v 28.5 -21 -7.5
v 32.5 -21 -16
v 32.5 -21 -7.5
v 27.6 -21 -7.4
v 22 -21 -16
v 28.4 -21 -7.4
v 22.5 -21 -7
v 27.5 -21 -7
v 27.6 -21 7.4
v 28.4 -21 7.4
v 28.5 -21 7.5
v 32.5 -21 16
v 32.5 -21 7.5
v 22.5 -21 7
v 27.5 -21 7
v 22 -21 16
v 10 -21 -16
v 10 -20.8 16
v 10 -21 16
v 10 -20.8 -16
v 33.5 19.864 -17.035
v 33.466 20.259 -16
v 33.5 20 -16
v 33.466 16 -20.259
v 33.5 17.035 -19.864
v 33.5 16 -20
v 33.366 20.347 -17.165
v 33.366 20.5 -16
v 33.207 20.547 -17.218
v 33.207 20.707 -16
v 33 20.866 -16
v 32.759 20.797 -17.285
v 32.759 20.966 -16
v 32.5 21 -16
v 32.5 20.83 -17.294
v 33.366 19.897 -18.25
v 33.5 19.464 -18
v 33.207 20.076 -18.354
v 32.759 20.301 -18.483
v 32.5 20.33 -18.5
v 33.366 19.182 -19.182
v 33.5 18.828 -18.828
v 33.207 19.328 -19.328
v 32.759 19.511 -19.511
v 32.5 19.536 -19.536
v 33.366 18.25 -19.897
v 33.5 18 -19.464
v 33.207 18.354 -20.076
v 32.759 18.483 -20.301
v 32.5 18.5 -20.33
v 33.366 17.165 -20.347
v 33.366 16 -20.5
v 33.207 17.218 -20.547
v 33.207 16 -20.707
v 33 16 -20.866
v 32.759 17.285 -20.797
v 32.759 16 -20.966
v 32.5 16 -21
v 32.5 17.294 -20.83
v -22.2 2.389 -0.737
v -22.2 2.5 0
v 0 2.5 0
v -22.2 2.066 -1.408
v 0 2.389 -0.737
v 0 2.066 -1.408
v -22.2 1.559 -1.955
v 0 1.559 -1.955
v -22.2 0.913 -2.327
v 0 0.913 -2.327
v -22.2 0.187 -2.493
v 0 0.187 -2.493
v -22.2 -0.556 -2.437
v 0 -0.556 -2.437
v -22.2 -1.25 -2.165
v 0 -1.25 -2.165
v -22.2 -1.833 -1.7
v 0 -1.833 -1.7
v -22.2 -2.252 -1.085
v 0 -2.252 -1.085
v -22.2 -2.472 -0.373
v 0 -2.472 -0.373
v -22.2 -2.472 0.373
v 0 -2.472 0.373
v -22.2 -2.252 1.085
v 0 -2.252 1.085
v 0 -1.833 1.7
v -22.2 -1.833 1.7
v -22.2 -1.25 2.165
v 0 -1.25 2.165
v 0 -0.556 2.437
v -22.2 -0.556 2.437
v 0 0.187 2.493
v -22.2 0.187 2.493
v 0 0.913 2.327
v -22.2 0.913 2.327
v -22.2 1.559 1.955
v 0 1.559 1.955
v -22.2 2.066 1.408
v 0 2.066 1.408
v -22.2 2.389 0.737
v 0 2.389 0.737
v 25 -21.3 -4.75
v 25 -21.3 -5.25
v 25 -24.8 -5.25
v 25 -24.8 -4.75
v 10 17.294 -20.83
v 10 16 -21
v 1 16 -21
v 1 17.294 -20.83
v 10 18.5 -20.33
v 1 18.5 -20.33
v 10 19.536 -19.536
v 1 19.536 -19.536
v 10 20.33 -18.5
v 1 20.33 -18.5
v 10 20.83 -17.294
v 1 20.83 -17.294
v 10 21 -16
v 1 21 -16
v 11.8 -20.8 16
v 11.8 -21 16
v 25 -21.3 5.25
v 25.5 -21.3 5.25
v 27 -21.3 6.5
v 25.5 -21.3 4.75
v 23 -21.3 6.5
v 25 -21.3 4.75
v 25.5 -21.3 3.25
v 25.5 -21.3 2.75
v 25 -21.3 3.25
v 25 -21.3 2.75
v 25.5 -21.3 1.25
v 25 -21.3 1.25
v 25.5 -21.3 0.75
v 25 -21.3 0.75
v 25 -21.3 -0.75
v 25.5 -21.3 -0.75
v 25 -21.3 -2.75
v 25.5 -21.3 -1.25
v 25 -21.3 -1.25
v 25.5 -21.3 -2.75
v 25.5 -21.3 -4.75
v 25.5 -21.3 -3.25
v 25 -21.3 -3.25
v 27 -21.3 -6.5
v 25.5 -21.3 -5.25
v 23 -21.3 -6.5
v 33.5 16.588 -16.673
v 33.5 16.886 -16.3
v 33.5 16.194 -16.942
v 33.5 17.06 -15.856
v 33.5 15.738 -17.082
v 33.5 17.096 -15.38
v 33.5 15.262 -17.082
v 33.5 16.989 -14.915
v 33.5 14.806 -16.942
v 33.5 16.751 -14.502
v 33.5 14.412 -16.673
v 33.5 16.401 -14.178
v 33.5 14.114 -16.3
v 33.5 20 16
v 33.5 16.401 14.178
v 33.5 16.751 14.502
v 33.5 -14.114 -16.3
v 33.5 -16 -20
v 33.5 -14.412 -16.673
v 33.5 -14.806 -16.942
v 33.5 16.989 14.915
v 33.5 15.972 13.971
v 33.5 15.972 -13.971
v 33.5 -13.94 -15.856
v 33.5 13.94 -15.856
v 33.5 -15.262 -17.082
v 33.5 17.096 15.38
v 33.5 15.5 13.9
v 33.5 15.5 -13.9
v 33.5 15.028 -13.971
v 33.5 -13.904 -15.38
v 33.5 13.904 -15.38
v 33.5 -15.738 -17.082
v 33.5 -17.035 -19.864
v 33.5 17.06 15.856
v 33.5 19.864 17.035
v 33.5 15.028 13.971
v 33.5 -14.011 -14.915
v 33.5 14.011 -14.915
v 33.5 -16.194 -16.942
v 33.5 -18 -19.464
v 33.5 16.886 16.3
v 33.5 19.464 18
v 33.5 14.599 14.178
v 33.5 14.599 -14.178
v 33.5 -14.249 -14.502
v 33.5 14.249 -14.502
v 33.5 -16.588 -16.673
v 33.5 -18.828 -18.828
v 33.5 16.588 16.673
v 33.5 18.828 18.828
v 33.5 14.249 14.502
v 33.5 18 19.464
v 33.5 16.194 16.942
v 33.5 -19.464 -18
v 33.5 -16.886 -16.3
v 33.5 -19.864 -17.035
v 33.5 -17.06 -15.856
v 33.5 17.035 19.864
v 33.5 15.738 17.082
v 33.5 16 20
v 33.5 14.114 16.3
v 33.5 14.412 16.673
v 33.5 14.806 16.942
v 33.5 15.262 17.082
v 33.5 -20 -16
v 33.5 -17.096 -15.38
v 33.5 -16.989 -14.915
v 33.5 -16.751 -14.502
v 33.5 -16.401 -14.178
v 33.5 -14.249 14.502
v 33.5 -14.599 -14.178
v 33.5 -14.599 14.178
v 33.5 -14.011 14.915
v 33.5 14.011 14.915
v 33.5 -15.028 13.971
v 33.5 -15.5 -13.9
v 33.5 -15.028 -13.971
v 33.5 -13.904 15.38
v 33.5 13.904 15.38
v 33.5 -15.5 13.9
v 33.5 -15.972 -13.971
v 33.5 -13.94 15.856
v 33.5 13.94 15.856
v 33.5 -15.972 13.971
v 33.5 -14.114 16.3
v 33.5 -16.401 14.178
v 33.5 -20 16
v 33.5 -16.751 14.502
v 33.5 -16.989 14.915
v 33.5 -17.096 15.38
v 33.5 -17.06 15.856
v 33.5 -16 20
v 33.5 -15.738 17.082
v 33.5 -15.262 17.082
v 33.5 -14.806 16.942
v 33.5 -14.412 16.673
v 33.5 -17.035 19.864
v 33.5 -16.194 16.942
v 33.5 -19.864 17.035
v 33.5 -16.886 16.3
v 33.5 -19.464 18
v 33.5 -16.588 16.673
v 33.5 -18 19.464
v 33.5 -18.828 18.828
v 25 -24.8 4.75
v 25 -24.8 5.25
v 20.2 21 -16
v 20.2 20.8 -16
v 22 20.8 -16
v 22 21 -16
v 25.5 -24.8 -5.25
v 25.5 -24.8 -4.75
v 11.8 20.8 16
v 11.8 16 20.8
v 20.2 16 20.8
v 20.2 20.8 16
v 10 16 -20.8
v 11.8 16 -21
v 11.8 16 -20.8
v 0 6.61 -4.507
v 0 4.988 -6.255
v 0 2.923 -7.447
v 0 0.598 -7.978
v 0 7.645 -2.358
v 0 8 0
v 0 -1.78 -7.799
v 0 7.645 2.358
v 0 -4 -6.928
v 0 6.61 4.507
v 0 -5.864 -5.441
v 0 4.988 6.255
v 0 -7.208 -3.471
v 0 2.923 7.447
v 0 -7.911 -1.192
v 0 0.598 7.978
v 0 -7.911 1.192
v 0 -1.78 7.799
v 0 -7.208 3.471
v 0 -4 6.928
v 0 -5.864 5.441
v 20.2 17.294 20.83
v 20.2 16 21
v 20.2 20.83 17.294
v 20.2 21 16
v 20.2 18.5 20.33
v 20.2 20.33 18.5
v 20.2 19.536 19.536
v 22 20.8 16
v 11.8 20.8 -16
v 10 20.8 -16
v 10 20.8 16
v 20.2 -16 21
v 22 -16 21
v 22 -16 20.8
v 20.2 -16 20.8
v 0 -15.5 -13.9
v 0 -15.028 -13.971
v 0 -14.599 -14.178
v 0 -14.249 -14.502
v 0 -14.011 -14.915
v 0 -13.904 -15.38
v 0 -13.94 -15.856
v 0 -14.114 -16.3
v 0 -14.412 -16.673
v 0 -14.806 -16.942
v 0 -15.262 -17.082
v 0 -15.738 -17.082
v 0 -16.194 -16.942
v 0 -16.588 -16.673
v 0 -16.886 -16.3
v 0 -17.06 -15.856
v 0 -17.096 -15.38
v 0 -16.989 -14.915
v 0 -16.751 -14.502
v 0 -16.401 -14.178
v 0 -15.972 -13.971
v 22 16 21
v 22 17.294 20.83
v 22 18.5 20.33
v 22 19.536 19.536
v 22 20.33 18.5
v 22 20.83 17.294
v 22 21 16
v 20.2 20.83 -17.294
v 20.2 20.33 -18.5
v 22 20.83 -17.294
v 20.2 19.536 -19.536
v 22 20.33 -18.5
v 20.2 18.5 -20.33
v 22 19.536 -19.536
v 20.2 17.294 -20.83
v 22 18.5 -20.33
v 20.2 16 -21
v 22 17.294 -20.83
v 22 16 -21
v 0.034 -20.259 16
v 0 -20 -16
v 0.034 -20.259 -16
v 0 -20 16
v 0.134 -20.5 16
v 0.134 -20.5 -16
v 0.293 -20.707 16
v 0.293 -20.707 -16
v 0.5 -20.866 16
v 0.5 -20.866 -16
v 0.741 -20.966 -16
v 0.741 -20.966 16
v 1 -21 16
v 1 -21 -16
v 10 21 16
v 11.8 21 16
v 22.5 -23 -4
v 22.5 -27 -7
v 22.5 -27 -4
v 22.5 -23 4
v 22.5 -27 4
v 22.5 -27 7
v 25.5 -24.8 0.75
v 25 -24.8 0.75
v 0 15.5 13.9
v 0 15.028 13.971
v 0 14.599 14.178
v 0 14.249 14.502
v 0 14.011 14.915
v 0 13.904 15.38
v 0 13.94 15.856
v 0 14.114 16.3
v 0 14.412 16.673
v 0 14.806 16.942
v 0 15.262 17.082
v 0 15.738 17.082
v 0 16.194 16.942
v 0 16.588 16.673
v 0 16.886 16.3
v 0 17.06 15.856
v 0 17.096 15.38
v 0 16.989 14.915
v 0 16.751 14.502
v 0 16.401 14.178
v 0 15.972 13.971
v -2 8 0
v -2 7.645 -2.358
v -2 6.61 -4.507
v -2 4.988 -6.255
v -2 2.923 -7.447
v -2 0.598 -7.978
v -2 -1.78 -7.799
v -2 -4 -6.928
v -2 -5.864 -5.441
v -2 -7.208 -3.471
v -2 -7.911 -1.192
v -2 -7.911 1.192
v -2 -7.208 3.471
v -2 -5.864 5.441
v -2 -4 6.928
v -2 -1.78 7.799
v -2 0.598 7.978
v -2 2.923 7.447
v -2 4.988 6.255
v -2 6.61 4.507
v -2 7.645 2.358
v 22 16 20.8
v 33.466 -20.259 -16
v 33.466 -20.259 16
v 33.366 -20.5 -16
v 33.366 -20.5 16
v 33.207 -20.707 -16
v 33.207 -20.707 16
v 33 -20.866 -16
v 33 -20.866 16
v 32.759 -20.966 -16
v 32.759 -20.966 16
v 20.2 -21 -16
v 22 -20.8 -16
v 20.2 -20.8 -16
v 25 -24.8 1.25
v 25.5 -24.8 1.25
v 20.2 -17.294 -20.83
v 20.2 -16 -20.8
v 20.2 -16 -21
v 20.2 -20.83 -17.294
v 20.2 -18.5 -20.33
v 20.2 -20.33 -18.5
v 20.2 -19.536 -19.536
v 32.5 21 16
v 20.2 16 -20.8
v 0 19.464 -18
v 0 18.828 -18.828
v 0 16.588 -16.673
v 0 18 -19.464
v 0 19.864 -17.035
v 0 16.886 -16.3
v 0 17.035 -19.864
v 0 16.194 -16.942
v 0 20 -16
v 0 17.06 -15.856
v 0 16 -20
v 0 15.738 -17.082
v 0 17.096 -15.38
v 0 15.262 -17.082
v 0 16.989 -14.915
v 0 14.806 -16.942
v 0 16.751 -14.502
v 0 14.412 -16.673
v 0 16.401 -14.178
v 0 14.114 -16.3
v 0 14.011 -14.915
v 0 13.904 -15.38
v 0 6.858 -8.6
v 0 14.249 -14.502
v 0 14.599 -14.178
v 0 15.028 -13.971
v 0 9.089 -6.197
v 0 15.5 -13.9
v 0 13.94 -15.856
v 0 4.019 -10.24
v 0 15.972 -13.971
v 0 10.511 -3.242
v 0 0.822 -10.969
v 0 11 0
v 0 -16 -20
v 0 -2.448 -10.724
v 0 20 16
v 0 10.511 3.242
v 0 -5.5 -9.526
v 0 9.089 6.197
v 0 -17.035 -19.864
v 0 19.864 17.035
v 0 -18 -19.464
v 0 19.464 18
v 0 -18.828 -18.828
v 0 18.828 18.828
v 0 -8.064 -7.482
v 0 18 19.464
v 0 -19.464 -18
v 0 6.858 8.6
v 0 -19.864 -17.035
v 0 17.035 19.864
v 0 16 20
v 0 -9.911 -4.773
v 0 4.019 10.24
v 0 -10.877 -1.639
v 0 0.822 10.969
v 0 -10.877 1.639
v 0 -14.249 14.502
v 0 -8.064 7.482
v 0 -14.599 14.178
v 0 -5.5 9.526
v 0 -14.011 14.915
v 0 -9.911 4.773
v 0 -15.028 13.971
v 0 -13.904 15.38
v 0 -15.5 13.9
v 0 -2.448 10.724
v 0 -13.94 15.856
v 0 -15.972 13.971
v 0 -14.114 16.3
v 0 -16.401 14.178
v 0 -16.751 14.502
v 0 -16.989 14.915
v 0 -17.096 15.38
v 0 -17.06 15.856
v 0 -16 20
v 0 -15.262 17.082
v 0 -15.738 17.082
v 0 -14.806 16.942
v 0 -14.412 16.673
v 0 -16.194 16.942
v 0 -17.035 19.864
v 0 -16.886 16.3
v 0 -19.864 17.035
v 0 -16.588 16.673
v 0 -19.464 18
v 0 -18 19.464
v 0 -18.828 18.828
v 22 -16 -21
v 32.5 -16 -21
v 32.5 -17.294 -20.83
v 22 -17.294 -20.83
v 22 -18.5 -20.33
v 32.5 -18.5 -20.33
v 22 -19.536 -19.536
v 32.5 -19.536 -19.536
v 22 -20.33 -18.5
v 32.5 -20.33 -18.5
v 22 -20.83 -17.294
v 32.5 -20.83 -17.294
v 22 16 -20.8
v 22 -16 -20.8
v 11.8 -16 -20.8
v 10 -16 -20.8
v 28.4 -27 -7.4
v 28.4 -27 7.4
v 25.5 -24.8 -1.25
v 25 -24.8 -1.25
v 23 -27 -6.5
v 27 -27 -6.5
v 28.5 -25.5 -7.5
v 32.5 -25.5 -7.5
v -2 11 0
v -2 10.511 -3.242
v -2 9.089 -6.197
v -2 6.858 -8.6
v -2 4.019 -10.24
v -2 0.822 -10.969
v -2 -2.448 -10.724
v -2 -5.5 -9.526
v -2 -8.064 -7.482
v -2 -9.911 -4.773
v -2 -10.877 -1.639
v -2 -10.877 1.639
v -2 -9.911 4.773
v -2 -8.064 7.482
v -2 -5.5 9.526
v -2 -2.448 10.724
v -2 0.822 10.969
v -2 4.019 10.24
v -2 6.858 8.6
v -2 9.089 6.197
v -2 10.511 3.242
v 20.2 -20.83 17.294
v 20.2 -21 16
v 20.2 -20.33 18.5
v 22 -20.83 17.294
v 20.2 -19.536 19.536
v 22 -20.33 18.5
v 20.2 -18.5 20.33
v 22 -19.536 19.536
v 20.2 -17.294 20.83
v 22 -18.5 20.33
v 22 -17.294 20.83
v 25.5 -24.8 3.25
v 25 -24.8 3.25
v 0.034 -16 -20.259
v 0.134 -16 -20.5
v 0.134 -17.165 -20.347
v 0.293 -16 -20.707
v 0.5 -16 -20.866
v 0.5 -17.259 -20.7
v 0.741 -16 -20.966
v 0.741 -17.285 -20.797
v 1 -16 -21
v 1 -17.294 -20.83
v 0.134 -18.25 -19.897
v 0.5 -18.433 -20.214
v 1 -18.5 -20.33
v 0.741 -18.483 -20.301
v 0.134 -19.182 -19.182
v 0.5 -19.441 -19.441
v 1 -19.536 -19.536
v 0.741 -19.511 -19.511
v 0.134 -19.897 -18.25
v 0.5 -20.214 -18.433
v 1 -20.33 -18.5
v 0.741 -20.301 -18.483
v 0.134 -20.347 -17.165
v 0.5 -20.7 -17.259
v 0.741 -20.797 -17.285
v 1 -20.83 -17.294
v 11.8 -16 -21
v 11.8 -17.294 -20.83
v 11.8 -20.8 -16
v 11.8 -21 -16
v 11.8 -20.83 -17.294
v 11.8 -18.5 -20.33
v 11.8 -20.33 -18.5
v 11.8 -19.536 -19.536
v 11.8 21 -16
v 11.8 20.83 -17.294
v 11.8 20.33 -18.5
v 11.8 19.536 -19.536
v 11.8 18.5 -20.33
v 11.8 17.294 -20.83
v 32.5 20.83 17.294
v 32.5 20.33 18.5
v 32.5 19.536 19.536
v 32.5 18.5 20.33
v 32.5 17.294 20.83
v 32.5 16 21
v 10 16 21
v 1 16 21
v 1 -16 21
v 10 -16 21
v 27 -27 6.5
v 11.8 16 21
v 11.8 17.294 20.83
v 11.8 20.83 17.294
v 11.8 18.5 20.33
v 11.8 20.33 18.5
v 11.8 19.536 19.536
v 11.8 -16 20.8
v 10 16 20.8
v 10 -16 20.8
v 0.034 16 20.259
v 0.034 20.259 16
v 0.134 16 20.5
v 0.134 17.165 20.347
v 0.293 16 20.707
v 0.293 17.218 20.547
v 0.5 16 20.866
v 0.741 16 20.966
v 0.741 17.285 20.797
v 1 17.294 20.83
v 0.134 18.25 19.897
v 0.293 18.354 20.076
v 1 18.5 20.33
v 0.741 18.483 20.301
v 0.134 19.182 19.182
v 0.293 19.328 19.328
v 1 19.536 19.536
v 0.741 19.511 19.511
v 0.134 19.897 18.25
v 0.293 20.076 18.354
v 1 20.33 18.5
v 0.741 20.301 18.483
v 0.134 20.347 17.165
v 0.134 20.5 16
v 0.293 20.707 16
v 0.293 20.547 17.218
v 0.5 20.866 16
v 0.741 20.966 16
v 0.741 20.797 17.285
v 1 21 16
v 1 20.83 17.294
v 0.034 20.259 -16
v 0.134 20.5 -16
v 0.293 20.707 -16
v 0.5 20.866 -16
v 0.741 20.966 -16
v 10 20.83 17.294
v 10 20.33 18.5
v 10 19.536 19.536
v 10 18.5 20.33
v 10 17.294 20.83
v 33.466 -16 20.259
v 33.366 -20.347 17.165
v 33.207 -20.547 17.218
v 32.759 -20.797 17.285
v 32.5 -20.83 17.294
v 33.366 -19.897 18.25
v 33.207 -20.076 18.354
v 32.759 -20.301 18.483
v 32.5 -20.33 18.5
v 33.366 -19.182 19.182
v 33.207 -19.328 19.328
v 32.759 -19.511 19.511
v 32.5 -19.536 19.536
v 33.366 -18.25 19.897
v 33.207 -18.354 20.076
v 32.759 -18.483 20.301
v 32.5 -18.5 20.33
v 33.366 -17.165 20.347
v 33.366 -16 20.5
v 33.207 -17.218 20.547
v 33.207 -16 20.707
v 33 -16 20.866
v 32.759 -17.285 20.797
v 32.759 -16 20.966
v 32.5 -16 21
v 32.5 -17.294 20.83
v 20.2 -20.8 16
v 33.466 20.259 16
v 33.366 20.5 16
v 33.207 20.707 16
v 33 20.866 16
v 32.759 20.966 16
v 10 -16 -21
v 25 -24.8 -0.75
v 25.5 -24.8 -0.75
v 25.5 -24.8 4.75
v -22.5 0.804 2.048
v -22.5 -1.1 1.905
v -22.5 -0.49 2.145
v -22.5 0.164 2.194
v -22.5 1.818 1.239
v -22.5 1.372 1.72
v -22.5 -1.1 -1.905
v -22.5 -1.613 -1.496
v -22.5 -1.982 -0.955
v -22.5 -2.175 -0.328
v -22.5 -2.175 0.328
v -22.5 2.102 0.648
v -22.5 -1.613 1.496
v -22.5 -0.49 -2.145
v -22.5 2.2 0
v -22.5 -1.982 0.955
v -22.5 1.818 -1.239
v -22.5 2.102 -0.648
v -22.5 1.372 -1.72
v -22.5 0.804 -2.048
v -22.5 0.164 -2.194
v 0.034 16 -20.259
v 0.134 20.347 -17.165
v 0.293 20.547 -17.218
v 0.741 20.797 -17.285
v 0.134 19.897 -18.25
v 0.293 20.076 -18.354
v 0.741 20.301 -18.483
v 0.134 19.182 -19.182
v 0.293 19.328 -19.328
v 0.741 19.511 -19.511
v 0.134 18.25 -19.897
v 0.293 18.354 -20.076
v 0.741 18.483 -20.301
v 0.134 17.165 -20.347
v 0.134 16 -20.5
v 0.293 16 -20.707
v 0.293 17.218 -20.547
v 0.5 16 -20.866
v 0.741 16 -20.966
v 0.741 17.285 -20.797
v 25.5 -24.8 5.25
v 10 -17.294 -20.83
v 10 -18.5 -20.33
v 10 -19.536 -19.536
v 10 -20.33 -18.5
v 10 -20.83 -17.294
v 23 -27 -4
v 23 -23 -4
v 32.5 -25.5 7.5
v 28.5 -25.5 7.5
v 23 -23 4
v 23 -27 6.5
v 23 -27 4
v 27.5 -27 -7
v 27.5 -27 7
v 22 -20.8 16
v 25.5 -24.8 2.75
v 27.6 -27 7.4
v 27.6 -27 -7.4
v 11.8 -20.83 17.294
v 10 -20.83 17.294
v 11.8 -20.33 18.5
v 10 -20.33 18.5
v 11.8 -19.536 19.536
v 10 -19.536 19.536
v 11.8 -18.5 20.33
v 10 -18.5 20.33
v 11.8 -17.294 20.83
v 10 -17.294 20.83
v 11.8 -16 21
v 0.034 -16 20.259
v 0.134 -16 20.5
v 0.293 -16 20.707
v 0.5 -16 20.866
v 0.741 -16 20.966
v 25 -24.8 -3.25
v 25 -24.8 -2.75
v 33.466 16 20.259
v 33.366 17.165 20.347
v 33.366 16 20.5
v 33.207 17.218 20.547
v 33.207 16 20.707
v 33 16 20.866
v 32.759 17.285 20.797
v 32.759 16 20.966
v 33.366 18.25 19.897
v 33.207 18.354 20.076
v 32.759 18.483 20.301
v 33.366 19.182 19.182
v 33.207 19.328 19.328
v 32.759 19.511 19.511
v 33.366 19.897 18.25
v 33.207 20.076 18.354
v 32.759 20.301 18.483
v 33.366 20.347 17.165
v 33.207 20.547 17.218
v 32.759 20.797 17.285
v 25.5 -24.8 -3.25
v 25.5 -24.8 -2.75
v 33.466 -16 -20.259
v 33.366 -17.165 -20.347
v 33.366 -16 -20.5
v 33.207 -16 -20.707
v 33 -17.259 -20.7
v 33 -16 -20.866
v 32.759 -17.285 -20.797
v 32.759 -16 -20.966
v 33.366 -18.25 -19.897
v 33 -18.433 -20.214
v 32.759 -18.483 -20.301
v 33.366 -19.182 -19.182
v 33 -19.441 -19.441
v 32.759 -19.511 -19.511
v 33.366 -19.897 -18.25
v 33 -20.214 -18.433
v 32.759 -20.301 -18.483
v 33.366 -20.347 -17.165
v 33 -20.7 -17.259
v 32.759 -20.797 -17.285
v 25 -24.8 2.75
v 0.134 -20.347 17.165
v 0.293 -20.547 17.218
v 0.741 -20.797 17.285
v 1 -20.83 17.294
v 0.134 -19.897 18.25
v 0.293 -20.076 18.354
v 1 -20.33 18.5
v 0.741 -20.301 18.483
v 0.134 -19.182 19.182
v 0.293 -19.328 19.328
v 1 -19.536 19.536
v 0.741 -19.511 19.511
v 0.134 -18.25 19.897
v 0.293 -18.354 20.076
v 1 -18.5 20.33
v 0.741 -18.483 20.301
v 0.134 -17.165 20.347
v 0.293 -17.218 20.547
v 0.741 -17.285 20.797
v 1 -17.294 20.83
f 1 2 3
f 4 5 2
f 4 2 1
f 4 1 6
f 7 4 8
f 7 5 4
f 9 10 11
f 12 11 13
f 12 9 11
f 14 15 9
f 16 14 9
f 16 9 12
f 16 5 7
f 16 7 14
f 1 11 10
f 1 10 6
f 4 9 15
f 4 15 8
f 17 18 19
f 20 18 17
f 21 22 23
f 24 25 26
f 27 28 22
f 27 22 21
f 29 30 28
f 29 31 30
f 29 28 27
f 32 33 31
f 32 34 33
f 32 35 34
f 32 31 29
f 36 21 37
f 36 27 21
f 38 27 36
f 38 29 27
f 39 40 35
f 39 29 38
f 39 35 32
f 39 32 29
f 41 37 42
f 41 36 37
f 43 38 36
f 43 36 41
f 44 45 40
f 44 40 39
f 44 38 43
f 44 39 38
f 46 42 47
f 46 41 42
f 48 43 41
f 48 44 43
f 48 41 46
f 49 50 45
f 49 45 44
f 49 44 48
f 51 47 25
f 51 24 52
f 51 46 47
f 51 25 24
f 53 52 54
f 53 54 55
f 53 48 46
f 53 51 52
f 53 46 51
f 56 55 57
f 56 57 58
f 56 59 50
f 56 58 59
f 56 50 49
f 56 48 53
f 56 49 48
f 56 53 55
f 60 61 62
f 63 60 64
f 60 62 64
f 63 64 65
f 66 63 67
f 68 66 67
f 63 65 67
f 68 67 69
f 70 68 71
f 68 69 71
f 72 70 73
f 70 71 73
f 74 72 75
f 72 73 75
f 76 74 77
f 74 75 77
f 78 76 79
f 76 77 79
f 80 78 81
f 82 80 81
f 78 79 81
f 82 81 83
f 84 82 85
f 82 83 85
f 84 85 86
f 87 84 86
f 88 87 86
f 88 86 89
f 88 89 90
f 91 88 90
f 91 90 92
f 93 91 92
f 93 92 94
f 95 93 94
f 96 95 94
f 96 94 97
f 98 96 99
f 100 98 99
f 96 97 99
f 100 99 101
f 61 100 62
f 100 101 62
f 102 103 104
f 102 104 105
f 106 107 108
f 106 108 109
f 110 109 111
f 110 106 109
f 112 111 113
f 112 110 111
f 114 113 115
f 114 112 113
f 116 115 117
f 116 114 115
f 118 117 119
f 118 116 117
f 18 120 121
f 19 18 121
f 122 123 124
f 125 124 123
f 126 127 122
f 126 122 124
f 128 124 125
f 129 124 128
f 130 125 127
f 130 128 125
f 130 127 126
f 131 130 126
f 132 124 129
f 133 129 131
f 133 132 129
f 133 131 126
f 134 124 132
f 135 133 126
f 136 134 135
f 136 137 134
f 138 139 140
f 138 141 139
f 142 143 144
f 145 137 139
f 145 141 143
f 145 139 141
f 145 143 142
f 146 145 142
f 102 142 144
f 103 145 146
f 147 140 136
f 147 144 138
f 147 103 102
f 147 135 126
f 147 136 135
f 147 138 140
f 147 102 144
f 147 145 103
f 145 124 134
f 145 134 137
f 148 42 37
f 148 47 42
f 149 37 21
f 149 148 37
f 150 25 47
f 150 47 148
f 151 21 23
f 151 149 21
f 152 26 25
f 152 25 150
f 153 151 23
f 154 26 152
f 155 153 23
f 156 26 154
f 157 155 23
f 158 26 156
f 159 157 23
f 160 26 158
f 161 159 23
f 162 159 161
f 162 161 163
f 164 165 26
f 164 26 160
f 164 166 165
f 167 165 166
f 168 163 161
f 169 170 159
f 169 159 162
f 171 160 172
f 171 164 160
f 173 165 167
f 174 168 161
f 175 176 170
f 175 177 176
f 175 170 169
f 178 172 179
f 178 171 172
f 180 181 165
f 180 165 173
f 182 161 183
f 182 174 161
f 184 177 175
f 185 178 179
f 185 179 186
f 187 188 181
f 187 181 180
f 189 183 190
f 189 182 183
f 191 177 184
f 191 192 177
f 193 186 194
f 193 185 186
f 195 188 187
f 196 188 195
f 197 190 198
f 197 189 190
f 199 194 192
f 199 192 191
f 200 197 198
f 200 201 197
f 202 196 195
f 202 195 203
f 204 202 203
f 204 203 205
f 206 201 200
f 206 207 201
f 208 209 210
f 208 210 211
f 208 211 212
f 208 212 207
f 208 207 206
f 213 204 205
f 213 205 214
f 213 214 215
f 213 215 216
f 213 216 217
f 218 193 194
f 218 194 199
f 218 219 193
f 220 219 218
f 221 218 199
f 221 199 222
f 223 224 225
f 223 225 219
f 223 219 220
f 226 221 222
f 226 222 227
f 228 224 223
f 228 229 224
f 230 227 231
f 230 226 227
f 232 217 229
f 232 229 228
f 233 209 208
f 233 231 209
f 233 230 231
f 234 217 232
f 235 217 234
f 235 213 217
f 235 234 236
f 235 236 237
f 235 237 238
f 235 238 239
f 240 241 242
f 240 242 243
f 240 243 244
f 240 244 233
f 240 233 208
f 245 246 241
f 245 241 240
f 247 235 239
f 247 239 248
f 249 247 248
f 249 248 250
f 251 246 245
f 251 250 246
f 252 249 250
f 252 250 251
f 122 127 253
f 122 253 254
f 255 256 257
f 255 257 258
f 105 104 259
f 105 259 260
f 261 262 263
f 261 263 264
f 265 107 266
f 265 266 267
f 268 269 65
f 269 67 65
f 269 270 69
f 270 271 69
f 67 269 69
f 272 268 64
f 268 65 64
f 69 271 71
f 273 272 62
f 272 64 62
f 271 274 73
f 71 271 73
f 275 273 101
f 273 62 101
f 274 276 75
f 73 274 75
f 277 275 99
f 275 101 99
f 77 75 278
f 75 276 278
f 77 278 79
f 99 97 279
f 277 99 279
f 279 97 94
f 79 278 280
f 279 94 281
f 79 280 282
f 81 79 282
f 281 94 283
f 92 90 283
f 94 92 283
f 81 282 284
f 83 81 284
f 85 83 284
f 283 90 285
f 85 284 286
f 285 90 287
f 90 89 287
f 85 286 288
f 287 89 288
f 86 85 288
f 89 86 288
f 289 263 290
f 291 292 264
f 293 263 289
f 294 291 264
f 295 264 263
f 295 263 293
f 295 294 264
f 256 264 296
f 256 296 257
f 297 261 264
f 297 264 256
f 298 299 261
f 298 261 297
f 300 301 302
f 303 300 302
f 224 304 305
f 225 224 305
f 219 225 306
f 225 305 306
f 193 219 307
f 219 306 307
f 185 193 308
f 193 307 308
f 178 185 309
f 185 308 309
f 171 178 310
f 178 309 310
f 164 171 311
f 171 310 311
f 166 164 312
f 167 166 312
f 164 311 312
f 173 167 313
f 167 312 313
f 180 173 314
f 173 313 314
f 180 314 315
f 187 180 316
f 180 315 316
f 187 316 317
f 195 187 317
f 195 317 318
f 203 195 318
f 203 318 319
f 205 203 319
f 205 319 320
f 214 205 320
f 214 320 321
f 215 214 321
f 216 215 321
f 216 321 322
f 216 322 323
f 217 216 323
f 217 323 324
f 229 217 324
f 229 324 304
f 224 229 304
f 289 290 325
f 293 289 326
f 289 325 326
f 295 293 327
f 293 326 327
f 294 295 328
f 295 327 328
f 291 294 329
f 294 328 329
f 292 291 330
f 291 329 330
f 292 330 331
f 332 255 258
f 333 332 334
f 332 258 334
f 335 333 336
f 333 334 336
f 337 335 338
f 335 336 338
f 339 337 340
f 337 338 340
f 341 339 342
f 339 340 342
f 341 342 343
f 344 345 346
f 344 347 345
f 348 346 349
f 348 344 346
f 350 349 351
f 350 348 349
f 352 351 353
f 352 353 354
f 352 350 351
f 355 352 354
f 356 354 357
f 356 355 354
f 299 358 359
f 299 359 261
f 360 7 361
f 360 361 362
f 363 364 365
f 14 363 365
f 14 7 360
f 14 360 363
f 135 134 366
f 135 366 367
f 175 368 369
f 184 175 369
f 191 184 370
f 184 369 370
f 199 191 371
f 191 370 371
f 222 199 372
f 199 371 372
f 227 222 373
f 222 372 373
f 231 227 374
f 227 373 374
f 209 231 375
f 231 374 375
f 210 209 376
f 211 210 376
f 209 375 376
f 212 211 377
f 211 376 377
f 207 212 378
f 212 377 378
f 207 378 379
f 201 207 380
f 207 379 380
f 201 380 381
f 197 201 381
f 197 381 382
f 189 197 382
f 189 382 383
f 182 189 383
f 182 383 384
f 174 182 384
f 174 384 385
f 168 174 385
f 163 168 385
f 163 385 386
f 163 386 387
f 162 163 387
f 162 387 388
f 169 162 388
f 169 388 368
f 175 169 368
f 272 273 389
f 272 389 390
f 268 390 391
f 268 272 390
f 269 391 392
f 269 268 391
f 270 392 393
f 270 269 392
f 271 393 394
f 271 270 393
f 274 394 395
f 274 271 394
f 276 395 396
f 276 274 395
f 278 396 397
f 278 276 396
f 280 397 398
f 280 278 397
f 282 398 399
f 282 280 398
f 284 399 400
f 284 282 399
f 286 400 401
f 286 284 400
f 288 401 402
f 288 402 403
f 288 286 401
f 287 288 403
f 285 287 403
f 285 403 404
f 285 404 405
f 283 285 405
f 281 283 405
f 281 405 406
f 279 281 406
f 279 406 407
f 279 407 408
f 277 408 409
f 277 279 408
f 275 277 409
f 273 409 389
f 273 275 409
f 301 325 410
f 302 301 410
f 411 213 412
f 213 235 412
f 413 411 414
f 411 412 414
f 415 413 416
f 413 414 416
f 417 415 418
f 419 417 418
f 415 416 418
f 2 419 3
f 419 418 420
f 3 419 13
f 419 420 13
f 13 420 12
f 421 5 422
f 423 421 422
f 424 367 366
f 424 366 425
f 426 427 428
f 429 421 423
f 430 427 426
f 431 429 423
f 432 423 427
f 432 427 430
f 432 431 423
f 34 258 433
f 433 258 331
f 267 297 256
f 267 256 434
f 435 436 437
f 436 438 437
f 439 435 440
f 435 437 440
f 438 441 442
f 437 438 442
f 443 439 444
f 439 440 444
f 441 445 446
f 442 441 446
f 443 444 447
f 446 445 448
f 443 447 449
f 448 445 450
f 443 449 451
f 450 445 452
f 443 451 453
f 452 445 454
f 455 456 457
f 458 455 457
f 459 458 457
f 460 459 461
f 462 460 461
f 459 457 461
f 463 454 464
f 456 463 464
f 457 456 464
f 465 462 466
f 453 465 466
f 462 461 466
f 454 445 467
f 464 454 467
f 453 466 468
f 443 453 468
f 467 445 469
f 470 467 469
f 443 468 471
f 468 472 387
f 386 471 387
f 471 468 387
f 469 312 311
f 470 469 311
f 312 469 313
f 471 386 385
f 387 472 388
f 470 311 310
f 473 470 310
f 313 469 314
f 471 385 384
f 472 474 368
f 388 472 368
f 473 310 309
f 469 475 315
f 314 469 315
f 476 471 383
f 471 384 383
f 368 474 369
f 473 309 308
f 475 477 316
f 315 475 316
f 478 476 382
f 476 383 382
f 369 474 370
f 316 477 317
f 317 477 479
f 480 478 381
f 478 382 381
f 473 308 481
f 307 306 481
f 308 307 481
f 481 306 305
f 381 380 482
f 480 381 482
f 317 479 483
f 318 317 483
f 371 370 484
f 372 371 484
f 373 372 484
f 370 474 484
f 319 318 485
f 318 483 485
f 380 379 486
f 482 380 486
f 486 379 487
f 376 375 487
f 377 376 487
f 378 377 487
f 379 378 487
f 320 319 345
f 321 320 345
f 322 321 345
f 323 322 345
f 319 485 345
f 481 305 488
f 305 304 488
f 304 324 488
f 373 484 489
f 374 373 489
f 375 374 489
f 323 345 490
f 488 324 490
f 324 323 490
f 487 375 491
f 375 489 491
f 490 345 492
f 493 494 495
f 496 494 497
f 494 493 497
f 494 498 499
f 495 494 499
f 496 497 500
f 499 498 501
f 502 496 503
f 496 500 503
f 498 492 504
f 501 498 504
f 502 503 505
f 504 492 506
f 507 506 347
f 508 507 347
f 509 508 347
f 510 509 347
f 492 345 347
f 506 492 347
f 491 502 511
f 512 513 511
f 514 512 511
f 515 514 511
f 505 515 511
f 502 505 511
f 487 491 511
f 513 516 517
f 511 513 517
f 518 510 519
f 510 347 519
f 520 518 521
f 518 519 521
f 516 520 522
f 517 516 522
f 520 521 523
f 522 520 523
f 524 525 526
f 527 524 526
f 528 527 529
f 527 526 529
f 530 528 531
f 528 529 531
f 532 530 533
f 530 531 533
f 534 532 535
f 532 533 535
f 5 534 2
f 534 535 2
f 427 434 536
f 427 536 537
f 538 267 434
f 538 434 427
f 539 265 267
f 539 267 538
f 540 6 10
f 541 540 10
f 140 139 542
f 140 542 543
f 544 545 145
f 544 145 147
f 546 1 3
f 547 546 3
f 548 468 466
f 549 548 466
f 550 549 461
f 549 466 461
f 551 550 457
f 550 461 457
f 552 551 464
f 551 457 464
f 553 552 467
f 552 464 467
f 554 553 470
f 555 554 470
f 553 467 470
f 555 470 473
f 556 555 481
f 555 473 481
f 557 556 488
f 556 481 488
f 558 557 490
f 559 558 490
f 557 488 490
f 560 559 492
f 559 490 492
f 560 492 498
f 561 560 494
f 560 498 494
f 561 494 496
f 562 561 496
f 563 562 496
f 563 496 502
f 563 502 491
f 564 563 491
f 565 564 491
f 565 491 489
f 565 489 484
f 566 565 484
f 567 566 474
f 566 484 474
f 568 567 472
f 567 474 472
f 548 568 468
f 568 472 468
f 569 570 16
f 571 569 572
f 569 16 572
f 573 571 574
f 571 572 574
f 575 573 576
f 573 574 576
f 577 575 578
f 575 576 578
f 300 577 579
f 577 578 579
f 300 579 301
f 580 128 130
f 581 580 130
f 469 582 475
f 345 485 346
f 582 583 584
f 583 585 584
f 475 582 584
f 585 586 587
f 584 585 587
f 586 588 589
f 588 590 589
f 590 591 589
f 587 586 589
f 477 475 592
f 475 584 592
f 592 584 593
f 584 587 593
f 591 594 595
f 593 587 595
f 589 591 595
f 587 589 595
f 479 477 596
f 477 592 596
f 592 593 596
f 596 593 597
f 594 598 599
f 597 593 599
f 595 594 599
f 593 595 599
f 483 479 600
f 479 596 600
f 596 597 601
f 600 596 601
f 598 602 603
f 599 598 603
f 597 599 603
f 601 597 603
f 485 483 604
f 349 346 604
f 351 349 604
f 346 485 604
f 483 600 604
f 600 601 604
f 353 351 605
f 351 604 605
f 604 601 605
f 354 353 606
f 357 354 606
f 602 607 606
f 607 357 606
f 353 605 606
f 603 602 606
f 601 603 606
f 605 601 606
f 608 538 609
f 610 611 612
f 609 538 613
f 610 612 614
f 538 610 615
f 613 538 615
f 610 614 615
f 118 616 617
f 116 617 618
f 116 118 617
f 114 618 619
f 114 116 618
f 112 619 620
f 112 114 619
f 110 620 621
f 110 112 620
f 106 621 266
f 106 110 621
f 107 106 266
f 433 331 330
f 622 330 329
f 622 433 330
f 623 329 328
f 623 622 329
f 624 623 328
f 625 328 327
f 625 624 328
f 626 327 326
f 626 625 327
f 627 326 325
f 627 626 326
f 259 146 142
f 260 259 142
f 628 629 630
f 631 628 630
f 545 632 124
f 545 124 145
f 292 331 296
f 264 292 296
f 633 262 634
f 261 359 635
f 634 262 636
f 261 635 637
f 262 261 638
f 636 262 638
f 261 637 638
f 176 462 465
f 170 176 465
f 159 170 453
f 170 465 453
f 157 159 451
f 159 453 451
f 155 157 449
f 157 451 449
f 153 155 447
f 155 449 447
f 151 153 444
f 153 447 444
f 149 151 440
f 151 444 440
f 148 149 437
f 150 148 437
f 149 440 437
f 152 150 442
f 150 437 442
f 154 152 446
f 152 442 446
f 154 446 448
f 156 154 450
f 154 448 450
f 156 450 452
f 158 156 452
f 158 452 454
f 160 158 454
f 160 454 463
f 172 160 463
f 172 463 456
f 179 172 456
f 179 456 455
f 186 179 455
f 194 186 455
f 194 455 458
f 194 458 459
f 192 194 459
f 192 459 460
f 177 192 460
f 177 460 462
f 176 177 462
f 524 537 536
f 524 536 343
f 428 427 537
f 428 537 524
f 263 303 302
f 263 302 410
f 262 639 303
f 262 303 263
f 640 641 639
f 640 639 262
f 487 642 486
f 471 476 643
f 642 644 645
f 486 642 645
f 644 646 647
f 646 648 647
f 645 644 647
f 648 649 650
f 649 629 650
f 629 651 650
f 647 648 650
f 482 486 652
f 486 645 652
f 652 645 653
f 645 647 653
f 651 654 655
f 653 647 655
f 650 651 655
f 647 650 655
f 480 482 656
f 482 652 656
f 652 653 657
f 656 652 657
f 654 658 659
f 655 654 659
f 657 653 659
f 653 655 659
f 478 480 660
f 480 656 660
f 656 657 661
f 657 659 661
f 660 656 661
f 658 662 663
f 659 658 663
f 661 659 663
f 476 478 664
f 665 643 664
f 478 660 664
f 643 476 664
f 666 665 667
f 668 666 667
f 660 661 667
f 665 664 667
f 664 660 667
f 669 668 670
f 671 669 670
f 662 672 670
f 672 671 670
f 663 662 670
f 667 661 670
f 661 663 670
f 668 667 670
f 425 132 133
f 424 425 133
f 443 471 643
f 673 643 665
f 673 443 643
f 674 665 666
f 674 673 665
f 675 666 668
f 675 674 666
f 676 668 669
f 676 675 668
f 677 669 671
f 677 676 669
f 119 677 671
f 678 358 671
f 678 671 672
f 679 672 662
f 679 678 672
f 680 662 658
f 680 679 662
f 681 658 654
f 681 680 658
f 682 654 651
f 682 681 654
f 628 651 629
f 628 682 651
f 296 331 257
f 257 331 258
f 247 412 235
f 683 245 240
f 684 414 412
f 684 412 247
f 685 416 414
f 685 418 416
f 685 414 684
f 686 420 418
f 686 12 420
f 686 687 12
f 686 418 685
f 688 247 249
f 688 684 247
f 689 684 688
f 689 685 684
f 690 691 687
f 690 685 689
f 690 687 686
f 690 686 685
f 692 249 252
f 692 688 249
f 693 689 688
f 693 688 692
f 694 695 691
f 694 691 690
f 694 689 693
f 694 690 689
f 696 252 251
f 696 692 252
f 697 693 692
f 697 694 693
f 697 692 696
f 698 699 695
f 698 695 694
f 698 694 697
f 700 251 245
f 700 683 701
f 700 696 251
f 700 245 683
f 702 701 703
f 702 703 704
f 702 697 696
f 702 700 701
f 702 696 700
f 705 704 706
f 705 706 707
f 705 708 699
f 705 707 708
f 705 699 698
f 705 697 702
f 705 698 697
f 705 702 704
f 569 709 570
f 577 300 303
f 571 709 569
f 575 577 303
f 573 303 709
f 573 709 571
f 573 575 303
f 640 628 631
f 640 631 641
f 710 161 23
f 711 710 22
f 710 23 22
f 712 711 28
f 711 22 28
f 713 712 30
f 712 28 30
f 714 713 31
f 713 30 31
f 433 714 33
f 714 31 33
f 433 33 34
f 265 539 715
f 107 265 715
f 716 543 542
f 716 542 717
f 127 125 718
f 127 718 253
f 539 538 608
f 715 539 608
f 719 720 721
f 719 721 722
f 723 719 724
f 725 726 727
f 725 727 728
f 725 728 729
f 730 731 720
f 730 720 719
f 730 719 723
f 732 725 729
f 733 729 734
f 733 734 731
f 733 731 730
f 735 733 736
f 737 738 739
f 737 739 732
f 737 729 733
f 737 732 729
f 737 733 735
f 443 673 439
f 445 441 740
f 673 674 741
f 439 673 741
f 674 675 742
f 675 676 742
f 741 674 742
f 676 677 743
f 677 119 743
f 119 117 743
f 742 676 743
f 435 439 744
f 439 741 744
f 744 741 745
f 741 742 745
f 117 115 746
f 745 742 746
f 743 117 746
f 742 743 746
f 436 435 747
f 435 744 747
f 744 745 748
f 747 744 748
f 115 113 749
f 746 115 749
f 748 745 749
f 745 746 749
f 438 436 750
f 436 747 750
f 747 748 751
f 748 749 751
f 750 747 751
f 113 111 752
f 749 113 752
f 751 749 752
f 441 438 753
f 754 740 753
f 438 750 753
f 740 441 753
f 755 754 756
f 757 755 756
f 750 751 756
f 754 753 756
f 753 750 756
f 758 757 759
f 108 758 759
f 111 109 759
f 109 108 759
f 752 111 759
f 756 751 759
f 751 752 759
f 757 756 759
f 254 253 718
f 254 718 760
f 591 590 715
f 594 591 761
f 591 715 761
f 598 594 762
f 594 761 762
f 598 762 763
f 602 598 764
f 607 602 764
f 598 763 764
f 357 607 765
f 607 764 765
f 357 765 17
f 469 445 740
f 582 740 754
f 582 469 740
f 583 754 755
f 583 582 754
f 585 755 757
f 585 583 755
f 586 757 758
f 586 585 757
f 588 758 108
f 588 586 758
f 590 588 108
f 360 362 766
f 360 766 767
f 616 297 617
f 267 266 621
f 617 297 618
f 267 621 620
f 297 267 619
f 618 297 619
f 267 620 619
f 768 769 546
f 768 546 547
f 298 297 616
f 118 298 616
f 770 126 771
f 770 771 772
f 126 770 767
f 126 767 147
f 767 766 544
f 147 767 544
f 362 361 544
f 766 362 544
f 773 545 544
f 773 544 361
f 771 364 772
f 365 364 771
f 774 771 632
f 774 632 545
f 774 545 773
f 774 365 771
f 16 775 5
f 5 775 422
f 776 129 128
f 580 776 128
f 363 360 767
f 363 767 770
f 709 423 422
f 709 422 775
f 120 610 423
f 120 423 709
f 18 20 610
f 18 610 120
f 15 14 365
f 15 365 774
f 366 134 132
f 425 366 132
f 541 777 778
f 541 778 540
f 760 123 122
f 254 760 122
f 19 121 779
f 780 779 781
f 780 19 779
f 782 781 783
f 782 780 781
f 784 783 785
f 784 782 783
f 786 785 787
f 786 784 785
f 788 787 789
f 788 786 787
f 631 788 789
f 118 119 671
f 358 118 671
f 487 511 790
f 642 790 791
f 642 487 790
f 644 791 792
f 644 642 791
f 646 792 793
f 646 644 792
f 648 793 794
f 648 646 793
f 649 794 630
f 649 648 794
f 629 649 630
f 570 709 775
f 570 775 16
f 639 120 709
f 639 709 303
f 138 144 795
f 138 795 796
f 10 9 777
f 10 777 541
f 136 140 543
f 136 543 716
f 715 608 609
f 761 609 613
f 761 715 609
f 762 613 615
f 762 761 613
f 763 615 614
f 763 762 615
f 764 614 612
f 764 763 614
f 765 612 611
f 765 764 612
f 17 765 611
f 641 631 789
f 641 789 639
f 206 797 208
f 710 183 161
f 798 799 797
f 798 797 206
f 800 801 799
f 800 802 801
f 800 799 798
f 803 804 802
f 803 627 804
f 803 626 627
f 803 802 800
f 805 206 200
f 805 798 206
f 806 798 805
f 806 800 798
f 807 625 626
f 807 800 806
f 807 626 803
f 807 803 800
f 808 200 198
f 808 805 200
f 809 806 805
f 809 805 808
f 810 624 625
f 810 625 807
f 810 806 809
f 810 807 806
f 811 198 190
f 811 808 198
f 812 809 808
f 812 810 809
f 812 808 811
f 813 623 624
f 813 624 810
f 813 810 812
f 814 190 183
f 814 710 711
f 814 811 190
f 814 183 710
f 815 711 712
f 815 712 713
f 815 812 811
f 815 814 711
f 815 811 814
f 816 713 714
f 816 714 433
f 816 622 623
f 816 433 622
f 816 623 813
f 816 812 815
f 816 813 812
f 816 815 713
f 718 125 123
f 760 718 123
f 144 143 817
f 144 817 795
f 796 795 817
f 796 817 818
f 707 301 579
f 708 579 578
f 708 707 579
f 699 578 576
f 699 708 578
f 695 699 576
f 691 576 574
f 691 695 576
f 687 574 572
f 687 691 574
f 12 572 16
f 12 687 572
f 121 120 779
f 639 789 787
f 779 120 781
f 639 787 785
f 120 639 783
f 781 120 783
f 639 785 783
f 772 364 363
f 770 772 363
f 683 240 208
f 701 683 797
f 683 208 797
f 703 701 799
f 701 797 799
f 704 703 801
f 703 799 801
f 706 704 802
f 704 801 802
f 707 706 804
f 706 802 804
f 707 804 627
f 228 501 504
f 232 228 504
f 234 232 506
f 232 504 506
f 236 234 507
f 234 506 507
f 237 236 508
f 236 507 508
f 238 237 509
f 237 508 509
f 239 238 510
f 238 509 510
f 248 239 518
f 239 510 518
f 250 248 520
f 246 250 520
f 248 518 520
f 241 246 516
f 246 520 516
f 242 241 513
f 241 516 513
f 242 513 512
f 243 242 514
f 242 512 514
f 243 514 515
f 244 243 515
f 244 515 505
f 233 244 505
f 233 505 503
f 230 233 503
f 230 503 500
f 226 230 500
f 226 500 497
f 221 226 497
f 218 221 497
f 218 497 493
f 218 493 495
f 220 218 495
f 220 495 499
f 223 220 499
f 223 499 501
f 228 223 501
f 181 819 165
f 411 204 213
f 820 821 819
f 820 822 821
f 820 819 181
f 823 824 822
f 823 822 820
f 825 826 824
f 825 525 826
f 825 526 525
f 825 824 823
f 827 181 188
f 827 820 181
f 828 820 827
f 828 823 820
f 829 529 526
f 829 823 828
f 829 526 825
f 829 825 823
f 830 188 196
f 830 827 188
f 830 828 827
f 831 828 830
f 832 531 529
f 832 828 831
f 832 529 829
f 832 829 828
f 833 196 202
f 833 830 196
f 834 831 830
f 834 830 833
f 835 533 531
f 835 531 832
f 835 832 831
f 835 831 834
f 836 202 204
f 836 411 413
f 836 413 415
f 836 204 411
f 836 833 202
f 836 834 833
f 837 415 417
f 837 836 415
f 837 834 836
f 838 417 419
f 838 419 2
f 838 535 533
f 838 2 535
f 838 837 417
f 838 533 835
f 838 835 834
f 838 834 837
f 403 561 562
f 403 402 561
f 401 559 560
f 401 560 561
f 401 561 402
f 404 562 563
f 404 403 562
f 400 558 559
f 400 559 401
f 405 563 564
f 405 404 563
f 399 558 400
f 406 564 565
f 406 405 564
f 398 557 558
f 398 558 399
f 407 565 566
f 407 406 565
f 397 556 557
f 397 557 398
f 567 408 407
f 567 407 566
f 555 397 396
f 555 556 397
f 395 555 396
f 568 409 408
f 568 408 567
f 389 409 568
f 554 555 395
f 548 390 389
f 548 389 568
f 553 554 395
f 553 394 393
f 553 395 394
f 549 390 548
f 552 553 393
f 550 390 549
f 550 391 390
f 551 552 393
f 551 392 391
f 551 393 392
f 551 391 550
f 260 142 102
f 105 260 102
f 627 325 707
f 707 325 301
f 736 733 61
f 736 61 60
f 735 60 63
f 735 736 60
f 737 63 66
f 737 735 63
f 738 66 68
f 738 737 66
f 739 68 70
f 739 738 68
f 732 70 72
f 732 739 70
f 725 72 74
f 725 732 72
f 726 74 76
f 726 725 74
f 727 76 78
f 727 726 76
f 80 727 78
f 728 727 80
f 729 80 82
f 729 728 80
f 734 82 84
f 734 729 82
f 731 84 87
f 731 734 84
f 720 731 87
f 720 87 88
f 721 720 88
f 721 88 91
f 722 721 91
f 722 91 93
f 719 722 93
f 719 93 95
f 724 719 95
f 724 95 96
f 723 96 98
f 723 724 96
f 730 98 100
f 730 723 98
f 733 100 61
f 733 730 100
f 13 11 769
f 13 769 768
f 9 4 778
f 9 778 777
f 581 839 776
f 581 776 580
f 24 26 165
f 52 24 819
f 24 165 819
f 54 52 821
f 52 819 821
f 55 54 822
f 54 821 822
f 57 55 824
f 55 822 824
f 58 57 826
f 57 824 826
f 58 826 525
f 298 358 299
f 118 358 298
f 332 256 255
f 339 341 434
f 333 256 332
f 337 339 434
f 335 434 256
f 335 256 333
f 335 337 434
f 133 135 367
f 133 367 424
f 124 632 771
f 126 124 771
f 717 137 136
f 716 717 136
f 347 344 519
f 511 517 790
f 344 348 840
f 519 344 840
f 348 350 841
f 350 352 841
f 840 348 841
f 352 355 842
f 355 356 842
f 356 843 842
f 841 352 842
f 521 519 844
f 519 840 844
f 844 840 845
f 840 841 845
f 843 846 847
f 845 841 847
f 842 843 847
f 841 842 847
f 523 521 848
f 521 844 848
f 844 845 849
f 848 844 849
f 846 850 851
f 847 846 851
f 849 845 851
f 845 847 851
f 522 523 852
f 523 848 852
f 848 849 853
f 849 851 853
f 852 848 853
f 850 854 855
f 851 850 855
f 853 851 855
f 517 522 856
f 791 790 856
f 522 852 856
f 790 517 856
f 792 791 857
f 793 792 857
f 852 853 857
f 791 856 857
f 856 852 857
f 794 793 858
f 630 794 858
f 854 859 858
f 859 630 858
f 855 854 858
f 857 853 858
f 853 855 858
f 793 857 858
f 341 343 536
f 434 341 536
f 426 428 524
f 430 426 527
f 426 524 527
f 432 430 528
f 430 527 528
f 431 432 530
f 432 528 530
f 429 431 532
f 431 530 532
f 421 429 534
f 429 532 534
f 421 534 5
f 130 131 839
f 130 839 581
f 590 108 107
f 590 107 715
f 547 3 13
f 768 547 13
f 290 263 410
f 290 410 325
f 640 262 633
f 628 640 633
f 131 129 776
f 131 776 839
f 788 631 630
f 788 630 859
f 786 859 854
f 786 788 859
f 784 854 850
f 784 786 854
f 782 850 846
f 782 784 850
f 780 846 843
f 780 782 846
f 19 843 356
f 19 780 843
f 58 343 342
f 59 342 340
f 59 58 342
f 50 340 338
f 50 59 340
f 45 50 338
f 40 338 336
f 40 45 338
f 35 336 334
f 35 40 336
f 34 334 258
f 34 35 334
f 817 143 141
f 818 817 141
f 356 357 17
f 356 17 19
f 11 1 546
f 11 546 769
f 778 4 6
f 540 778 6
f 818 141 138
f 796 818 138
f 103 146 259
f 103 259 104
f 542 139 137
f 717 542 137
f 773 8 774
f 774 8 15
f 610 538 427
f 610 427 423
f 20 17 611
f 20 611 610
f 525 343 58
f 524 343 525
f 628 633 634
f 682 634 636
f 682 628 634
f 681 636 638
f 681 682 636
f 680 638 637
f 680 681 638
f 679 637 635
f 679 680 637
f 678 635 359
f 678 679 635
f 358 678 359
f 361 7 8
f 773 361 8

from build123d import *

# Parameters (mm, degrees)
SKETCH1_W           = 42
SKETCH1_H           = 42
BASE_EXTRUDE_DEPTH  = 33.5
FILLET1_R           = 5
SKETCH2_R           = 11
SKETCH2_R_2         = 8
BOSS_EXTRUDE1_DEPTH = 2
SKETCH3_R           = 2.5
BOSS_EXTRUDE2_DEPTH = 22.5
FILLET2_R           = 1
SKETCH4_R           = 1.6
CUT_EXTRUDE1_DEPTH  = 45.768850778
SKETCH5_R           = 1.6
CUT_EXTRUDE2_DEPTH  = 45.768850778
SKETCH6_R           = 1.6
CUT_EXTRUDE3_DEPTH  = 45.768850778
SKETCH7_R           = 1.6
CUT_EXTRUDE4_DEPTH  = 45.768850778
SKETCH9_OUTSIDE_W   = 60.326
SKETCH9_OUTSIDE_H   = 60.326
CUT_EXTRUDE8_DEPTH  = 12
BOSS_EXTRUDE3_START = 1.8
BOSS_EXTRUDE3_DEPTH = 1.8
BOSS_EXTRUDE4_DEPTH = 1.8
CIRPATTERN1_COUNT   = 4
SKETCH13_W          = 4
SKETCH13_H          = 15
BOSS_EXTRUDE6_DEPTH = 4.5
SKETCH14_W          = 5
SKETCH14_H          = 14
BOSS_EXTRUDE7_DEPTH = 6
SKETCH15_W          = 4
SKETCH15_H          = 13
CUT_EXTRUDE9_DEPTH  = 5.7
SKETCH16_W          = 4
SKETCH16_H          = 8
CUT_EXTRUDE10_DEPTH = 1
SKETCH17_W          = 0.5
SKETCH17_H          = 0.5
BOSS_EXTRUDE8_DEPTH = 3.5
LPATTERN1_COUNT     = 6
LPATTERN1_PITCH     = 2
SKETCH18_W          = 0.8
SKETCH18_H          = 14.8
BOSS_EXTRUDE9_DEPTH = 6
CHAMFER1_SIZE       = 0.3


with BuildPart() as part:
    # Sketch1 → Base-Extrude (new body)
    with BuildSketch(Plane(origin=(0, 0, 0), x_dir=(0, 0, 1), z_dir=(1, 0, 0))):
        Rectangle(SKETCH1_W, SKETCH1_H)
    extrude(amount=BASE_EXTRUDE_DEPTH)

    # Fillet1
    fillet1_edges = [part.edges().sort_by_distance(p)[0] for p in [
        (16.75, -21, 21),
        (16.75, -21, -21),
        (16.75, 21, 21),
        (16.75, 21, -21),
    ]]
    fillet(fillet1_edges, radius=FILLET1_R)

    # Sketch2 → Boss-Extrude1 (add)
    with BuildSketch(Plane(origin=(0, 0, 0), x_dir=(0, 1, 0), z_dir=(-1, 0, 0))):
        Circle(SKETCH2_R)
        Circle(SKETCH2_R_2, mode=Mode.SUBTRACT)
    extrude(amount=BOSS_EXTRUDE1_DEPTH)

    # Sketch3 → Boss-Extrude2 (add)
    with BuildSketch(Plane(origin=(0, 0, 0), x_dir=(0, 1, 0), z_dir=(-1, 0, 0))):
        Circle(SKETCH3_R)
    extrude(amount=BOSS_EXTRUDE2_DEPTH)

    # Fillet2
    fillet2_edges = [part.edges().sort_by_distance(p)[0] for p in [
        (0, 21, 0),
        (0, 19.535533906, 19.535533906),
        (0, 0, 21),
        (0, -19.535533906, 19.535533906),
        (0, -21, 0),
        (0, -19.535533906, -19.535533906),
        (0, 0, -21),
        (0, 19.535533906, -19.535533906),
        (33.5, 21, 0),
        (33.5, 19.535533906, 19.535533906),
        (33.5, 0, 21),
        (33.5, -19.535533906, 19.535533906),
        (33.5, -21, 0),
        (33.5, -19.535533906, -19.535533906),
        (33.5, 0, -21),
        (33.5, 19.535533906, -19.535533906),
    ]]
    fillet(fillet2_edges, radius=FILLET2_R)

    # Sketch4 → Cut-Extrude1 (cut, through all)
    with BuildSketch(Plane.ZY):
        with Locations((-15.5, 15.5)):
            Circle(SKETCH4_R)
    extrude(amount=-CUT_EXTRUDE1_DEPTH, mode=Mode.SUBTRACT)

    # Sketch5 → Cut-Extrude2 (cut, through all)
    with BuildSketch(Plane.ZY):
        with Locations((-15.5, -15.5)):
            Circle(SKETCH5_R)
    extrude(amount=-CUT_EXTRUDE2_DEPTH, mode=Mode.SUBTRACT)

    # Sketch6 → Cut-Extrude3 (cut, through all)
    with BuildSketch(Plane(origin=(0, 0, 0), x_dir=(0, 0, -1), z_dir=(-1, 0, 0))):
        with Locations((-15.5, -15.5)):
            Circle(SKETCH6_R)
    extrude(amount=-CUT_EXTRUDE3_DEPTH, mode=Mode.SUBTRACT)

    # Sketch7 → Cut-Extrude4 (cut, through all)
    with BuildSketch(Plane(origin=(0, 0, 0), x_dir=(0, 0, -1), z_dir=(-1, 0, 0))):
        with Locations((-15.5, 15.5)):
            Circle(SKETCH7_R)
    extrude(amount=-CUT_EXTRUDE4_DEPTH, mode=Mode.SUBTRACT)

    # Sketch9 outside → Cut-Extrude8 (cut)
    with BuildSketch(Plane(origin=(10, 0, 0), x_dir=(0, 0, -1), z_dir=(1, 0, 0))):
        Rectangle(SKETCH9_OUTSIDE_W, SKETCH9_OUTSIDE_H)
        Polygon((20.8, 16), (20.8, -16), (16, -20.8), (-16, -20.8), (-20.8, -16), (-20.8, 16), (-16, 20.8), (16, 20.8), align=None, mode=Mode.SUBTRACT)
    extrude(amount=CUT_EXTRUDE8_DEPTH, mode=Mode.SUBTRACT)

    # Sketch10 → Boss-Extrude3 (add)
    with BuildSketch(Plane(origin=(10, 0, 0), x_dir=(0, 0, -1), z_dir=(1, 0, 0)).offset(BOSS_EXTRUDE3_START)):
        with BuildLine():
            Line((-16, 20.8), (-20.8, 16))
            Line((-20.8, 16), (-21, 16))
            ThreePointArc((-21, 16), (-19.535533906, 19.535533906), (-16, 21))
            Line((-16, 21), (-16, 20.8))
        make_face()
    boss_extrude3 = extrude(amount=-BOSS_EXTRUDE3_DEPTH)

    # Sketch11 → Boss-Extrude4 (add)
    with BuildSketch(Plane.ZY.offset(-22)):
        with BuildLine():
            Line((16, 20.8), (20.8, 16))
            Line((20.8, 16), (21, 16))
            ThreePointArc((21, 16), (19.535533906, 19.535533906), (16, 21))
            Line((16, 21), (16, 20.8))
        make_face()
    boss_extrude4 = extrude(amount=BOSS_EXTRUDE4_DEPTH)

    # CirPattern1: Boss-Extrude3, Boss-Extrude4 ×4 about axis
    cirpattern1_axis = Axis((-22.5, 0, 0), (1, 0, 0))
    add([boss_extrude3.rotate(cirpattern1_axis, i * 360 / CIRPATTERN1_COUNT) for i in range(1, CIRPATTERN1_COUNT)])
    add([boss_extrude4.rotate(cirpattern1_axis, i * 360 / CIRPATTERN1_COUNT) for i in range(1, CIRPATTERN1_COUNT)])

    # Sketch13 → Boss-Extrude6 (add)
    with BuildSketch(Plane.XZ.offset(21)):
        with Locations((30.5, 0)):
            Rectangle(SKETCH13_W, SKETCH13_H)
    extrude(amount=BOSS_EXTRUDE6_DEPTH)

    # Sketch14 → Boss-Extrude7 (add)
    with BuildSketch(Plane(origin=(-111.861481215, -21, -36.560355199), x_dir=(1, 0, 0), z_dir=(0, -1, 0))):
        with Locations((136.861481215, 36.560355199)):
            Rectangle(SKETCH14_W, SKETCH14_H)
    extrude(amount=BOSS_EXTRUDE7_DEPTH)

    # Sketch15 → Cut-Extrude9 (cut)
    with BuildSketch(Plane(origin=(-111.861481215, -27, 3.287540826), x_dir=(-1, 0, 0), z_dir=(0, -1, 0))):
        with Locations((-136.861481215, 3.287540826)):
            Rectangle(SKETCH15_W, SKETCH15_H)
    extrude(amount=-CUT_EXTRUDE9_DEPTH, mode=Mode.SUBTRACT)

    # Sketch16 → Cut-Extrude10 (cut)
    with BuildSketch(Plane(origin=(22.5, -161.361481215, -36.560355199), x_dir=(0, 1, 0), z_dir=(1, 0, 0))):
        with Locations((136.361481215, 36.560355199)):
            Rectangle(SKETCH16_W, SKETCH16_H)
    extrude(amount=CUT_EXTRUDE10_DEPTH, mode=Mode.SUBTRACT)

    # Sketch17 → Boss-Extrude8 (add)
    with BuildSketch(Plane(origin=(-20.898451589, -21.3, 138.79747363), x_dir=(0, 0, 1), z_dir=(0, -1, 0))):
        with Locations((-133.79747363, -46.148451589)):
            Rectangle(SKETCH17_W, SKETCH17_H)
    boss_extrude8 = extrude(amount=BOSS_EXTRUDE8_DEPTH)

    # LPattern1: Boss-Extrude8 ×6
    with Locations(*[(0, 0, -i * LPATTERN1_PITCH) for i in range(1, LPATTERN1_COUNT)]):
        add(boss_extrude8)

    # Sketch18 → Boss-Extrude9 (add)
    with BuildSketch(Plane.XZ.offset(21)):
        with Locations((28, 0)):
            Rectangle(SKETCH18_W, SKETCH18_H)
    extrude(amount=BOSS_EXTRUDE9_DEPTH)

    # Chamfer1
    chamfer1_edges = [part.edges().sort_by_distance(p)[0] for p in [
        (-22.5, -2.5, 0),
    ]]
    chamfer(chamfer1_edges, length=CHAMFER1_SIZE)


solid = part.part
